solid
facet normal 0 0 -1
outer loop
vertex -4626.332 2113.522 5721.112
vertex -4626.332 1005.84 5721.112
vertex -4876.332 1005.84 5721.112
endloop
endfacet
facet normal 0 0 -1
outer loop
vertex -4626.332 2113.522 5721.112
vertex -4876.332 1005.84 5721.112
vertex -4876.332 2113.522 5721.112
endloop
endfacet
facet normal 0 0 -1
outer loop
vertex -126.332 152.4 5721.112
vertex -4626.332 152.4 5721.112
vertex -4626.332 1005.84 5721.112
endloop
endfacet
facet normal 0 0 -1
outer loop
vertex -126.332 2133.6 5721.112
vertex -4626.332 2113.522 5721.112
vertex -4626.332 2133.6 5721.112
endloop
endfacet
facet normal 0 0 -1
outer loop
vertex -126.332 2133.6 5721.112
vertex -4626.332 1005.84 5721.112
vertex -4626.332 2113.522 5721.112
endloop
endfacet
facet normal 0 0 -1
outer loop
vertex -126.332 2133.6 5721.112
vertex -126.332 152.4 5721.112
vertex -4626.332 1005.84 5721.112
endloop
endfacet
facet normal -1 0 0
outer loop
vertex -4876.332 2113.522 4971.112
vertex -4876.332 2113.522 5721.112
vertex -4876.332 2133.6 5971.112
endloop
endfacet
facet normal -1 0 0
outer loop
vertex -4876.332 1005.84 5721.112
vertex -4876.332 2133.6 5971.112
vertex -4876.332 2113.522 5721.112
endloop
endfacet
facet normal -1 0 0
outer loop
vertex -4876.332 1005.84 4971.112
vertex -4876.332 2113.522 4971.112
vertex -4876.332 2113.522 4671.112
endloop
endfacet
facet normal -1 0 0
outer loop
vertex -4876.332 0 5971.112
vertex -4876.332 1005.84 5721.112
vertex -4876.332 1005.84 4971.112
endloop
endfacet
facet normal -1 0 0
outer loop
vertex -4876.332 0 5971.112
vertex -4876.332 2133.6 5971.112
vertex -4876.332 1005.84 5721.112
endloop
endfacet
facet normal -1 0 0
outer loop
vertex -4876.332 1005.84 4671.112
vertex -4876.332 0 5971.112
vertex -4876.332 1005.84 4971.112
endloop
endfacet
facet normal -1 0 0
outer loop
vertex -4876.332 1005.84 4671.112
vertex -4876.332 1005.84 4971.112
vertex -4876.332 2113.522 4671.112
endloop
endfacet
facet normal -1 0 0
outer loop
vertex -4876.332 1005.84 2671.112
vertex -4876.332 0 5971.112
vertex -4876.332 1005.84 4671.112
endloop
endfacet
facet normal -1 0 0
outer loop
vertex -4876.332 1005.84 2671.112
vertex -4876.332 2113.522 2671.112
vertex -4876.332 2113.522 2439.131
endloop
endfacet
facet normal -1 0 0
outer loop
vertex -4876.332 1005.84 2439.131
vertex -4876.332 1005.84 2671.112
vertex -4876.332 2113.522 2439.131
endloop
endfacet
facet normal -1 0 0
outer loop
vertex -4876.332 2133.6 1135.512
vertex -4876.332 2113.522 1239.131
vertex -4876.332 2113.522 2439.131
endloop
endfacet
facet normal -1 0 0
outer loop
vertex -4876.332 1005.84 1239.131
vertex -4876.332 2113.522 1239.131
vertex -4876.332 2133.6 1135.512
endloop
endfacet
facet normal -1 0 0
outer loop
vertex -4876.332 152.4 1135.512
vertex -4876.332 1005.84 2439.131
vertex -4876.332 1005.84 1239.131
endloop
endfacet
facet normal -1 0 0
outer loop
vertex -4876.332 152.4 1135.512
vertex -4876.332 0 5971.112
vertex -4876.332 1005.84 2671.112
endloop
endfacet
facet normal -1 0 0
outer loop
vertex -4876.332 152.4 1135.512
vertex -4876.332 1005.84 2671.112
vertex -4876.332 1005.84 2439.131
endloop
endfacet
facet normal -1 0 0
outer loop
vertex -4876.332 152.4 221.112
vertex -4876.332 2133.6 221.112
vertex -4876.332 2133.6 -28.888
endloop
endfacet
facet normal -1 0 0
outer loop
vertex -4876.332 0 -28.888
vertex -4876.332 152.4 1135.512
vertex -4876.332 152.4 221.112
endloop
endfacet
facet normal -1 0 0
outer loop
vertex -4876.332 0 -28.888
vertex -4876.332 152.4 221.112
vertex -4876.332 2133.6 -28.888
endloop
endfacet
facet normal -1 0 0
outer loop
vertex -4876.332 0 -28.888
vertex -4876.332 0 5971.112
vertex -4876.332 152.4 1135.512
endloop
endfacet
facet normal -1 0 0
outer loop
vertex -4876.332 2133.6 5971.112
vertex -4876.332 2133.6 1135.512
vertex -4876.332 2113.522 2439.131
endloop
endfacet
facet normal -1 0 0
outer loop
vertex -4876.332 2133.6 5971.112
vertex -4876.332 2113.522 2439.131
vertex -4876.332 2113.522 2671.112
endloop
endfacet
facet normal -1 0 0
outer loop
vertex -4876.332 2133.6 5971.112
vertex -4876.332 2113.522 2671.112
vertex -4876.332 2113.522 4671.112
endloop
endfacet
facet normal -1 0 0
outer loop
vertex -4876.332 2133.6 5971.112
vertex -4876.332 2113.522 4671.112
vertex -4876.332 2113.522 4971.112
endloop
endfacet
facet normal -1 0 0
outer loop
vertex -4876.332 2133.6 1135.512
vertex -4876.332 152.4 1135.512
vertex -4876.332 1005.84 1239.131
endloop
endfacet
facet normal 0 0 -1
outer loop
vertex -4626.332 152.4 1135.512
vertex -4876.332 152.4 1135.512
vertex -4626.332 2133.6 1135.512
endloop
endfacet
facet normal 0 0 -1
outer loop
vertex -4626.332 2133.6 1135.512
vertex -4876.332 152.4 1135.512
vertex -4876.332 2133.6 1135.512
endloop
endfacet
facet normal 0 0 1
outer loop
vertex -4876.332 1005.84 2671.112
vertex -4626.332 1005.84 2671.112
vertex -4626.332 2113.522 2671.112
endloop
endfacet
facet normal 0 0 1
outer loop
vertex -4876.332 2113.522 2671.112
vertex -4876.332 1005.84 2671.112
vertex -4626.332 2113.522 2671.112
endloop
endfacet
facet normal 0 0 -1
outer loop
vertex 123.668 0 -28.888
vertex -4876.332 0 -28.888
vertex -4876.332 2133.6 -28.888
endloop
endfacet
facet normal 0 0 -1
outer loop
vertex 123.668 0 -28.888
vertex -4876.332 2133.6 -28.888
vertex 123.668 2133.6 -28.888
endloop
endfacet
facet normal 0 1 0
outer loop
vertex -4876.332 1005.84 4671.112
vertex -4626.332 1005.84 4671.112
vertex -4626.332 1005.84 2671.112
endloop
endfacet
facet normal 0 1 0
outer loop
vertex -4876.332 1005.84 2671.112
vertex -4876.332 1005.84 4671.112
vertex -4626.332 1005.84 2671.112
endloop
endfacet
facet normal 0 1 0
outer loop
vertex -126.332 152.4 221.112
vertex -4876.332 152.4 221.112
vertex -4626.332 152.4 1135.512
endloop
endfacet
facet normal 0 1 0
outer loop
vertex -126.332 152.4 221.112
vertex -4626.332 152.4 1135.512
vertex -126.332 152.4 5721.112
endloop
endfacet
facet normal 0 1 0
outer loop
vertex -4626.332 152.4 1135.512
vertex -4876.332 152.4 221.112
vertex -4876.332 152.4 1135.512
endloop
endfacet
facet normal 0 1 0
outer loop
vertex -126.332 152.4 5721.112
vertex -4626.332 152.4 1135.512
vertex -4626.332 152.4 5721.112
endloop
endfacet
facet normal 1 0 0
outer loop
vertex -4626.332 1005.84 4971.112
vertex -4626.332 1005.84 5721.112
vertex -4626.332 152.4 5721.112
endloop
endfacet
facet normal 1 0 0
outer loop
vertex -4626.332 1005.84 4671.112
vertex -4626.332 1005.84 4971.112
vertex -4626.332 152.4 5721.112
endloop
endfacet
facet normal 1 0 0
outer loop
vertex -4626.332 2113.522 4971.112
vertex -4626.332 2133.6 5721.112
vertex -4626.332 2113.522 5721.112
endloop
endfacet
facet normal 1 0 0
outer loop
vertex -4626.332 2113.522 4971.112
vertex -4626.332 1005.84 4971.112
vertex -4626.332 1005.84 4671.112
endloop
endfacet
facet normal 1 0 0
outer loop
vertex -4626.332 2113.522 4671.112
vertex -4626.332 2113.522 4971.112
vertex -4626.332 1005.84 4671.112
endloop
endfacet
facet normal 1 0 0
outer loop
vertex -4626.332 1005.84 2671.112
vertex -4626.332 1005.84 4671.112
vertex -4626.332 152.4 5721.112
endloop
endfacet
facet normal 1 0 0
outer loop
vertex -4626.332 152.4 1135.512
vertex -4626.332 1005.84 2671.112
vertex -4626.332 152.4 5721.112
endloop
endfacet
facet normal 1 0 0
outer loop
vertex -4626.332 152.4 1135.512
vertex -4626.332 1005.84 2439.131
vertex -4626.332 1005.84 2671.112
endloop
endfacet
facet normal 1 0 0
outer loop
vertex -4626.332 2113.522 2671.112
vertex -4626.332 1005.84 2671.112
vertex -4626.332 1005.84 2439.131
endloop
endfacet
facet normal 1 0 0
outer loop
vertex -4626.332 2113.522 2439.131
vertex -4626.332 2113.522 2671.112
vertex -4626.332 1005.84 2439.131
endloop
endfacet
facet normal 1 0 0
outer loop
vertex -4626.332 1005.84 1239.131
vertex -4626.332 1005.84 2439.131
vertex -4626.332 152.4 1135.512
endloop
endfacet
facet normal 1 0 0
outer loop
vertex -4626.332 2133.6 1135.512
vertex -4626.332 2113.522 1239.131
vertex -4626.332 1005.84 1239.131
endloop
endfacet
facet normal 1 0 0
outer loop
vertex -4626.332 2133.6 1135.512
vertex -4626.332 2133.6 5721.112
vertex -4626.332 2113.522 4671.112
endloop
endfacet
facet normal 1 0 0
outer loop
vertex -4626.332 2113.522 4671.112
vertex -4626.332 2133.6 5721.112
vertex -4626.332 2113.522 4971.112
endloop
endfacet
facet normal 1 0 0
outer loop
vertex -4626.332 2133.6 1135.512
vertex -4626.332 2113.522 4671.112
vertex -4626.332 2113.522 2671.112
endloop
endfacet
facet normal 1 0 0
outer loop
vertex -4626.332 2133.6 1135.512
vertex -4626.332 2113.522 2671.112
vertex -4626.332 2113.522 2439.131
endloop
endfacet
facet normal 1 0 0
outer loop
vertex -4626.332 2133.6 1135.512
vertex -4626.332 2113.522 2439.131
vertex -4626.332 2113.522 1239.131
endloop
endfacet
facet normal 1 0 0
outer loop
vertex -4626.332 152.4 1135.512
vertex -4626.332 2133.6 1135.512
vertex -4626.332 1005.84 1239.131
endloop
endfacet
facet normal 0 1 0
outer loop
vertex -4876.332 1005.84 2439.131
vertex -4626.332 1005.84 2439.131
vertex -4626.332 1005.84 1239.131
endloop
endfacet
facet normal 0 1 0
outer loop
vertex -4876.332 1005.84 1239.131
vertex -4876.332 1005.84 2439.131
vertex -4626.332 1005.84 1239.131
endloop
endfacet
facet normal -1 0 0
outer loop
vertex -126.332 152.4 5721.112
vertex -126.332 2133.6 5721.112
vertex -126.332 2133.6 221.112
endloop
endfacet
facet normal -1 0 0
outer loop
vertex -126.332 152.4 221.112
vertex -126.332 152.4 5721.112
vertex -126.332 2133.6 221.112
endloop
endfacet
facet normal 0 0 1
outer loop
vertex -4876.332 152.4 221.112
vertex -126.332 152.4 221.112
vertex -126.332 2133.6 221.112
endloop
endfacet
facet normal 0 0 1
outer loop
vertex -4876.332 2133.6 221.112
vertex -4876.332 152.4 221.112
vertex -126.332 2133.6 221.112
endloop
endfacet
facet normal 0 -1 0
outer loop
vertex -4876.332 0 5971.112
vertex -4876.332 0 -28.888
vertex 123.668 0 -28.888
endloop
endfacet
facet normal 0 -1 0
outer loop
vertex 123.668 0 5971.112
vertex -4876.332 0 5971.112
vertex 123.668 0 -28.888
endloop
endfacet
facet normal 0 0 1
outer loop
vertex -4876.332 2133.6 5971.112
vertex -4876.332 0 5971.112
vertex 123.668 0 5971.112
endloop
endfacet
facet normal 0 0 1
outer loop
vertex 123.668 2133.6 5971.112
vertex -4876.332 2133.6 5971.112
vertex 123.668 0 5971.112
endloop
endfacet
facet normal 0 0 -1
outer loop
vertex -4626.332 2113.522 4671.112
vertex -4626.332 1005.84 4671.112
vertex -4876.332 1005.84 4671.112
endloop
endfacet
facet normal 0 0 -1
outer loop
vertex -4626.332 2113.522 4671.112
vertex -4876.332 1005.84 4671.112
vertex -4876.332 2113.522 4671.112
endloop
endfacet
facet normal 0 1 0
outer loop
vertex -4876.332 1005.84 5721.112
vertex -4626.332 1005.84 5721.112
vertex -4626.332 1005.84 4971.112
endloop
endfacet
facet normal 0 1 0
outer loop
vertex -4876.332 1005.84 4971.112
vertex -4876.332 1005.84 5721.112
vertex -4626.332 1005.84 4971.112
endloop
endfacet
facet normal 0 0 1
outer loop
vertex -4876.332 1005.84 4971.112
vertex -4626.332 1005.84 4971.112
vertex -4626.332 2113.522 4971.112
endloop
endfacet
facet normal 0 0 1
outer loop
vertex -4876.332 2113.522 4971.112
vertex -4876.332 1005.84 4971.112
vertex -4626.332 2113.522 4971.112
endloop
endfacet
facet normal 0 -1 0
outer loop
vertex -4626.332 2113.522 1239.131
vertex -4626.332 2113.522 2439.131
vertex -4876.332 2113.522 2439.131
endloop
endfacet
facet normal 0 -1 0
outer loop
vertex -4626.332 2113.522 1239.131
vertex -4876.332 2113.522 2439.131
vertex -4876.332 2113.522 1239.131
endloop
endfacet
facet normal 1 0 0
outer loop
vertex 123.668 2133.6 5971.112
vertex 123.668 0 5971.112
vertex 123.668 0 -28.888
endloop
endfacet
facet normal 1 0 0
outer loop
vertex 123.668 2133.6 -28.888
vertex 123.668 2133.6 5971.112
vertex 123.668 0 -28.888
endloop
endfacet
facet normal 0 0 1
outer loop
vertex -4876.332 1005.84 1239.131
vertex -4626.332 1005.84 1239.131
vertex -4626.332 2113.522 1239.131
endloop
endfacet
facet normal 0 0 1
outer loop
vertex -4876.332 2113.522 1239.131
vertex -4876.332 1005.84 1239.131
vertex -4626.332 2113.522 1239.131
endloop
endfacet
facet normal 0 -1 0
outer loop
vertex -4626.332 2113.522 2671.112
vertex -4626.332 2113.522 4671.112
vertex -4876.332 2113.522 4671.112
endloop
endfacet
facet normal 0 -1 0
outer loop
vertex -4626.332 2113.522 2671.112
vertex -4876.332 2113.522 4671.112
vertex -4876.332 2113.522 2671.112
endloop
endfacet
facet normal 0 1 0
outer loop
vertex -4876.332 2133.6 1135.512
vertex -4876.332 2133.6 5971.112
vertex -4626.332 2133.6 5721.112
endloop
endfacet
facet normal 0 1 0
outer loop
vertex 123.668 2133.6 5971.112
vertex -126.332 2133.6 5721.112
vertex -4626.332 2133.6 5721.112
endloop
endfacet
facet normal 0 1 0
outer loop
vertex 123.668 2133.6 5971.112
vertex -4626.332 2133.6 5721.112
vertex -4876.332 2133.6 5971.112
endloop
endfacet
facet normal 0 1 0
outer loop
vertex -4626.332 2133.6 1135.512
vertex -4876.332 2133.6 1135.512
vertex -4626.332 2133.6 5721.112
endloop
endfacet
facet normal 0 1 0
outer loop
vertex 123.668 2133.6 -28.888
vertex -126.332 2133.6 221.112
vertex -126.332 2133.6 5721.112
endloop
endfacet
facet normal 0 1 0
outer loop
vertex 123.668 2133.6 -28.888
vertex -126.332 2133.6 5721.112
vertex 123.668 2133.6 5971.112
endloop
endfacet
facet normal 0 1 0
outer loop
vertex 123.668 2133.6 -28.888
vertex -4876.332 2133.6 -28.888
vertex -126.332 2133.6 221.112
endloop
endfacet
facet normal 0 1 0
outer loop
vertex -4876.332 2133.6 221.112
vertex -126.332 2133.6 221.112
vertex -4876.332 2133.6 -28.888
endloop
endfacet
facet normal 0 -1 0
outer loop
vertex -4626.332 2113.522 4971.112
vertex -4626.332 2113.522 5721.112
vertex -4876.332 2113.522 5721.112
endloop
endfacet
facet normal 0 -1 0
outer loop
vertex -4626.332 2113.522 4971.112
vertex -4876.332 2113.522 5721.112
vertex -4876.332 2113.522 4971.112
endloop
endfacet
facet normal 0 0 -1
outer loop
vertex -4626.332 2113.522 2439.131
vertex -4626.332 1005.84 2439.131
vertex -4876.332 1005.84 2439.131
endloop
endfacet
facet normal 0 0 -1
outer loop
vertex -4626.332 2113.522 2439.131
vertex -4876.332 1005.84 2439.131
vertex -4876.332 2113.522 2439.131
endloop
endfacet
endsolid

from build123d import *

# Parameters (mm, degrees)
SKETCH2_W           = 5000
SKETCH2_H           = 6000
BOSS_EXTRUDE1_DEPTH = 2133.6
SKETCH3_W           = 4500
SKETCH3_H           = 5500
WALL_DEPTH          = 1981.2
SKETCH5_W           = 1200
SKETCH5_H           = 1107.681828729
SKETCH5_W_2         = 750
SKETCH5_W_3         = 2000
DOOR_DEPTH          = 250
SKETCH4_W           = 914.4
SKETCH4_H           = 1981.2
WINDOWS_DEPTH       = 250


with BuildPart() as part:
    # Sketch2 → Boss-Extrude1 (new body)
    with BuildSketch(Plane(origin=(0, 0, 0), x_dir=(1, 0, 0), z_dir=(0, 1, 0))):
        with Locations((-2376.332337721, -2971.11164006)):
            Rectangle(SKETCH2_W, SKETCH2_H)
    extrude(amount=BOSS_EXTRUDE1_DEPTH)

    # Sketch3 → Wall (cut)
    with BuildSketch(Plane(origin=(0, 2133.6, 0), x_dir=(1, 0, 0), z_dir=(0, 1, 0))):
        with Locations((-2376.332337721, -2971.11164006)):
            Rectangle(SKETCH3_W, SKETCH3_H)
    extrude(amount=-WALL_DEPTH, mode=Mode.SUBTRACT)

    # Sketch5 → Door (cut)
    with BuildSketch(Plane(origin=(-4626.332337721, 0, 0), x_dir=(0, 0, -1), z_dir=(1, 0, 0))):
        with Locations((-1839.131416276, 1559.680914365)):
            Rectangle(SKETCH5_W, SKETCH5_H)
        with Locations((-5346.11164006, 1559.680914365)):
            Rectangle(SKETCH5_W_2, SKETCH5_H)
        with Locations((-3671.11164006, 1559.680914365)):
            Rectangle(SKETCH5_W_3, SKETCH5_H)
    extrude(amount=-DOOR_DEPTH, mode=Mode.SUBTRACT)

    # Sketch4 → Windows (cut)
    with BuildSketch(Plane.ZY.offset(4876.332337721)):
        with Locations((678.31164006, 1143)):
            Rectangle(SKETCH4_W, SKETCH4_H)
    extrude(amount=-WINDOWS_DEPTH, mode=Mode.SUBTRACT)


solid = part.part
